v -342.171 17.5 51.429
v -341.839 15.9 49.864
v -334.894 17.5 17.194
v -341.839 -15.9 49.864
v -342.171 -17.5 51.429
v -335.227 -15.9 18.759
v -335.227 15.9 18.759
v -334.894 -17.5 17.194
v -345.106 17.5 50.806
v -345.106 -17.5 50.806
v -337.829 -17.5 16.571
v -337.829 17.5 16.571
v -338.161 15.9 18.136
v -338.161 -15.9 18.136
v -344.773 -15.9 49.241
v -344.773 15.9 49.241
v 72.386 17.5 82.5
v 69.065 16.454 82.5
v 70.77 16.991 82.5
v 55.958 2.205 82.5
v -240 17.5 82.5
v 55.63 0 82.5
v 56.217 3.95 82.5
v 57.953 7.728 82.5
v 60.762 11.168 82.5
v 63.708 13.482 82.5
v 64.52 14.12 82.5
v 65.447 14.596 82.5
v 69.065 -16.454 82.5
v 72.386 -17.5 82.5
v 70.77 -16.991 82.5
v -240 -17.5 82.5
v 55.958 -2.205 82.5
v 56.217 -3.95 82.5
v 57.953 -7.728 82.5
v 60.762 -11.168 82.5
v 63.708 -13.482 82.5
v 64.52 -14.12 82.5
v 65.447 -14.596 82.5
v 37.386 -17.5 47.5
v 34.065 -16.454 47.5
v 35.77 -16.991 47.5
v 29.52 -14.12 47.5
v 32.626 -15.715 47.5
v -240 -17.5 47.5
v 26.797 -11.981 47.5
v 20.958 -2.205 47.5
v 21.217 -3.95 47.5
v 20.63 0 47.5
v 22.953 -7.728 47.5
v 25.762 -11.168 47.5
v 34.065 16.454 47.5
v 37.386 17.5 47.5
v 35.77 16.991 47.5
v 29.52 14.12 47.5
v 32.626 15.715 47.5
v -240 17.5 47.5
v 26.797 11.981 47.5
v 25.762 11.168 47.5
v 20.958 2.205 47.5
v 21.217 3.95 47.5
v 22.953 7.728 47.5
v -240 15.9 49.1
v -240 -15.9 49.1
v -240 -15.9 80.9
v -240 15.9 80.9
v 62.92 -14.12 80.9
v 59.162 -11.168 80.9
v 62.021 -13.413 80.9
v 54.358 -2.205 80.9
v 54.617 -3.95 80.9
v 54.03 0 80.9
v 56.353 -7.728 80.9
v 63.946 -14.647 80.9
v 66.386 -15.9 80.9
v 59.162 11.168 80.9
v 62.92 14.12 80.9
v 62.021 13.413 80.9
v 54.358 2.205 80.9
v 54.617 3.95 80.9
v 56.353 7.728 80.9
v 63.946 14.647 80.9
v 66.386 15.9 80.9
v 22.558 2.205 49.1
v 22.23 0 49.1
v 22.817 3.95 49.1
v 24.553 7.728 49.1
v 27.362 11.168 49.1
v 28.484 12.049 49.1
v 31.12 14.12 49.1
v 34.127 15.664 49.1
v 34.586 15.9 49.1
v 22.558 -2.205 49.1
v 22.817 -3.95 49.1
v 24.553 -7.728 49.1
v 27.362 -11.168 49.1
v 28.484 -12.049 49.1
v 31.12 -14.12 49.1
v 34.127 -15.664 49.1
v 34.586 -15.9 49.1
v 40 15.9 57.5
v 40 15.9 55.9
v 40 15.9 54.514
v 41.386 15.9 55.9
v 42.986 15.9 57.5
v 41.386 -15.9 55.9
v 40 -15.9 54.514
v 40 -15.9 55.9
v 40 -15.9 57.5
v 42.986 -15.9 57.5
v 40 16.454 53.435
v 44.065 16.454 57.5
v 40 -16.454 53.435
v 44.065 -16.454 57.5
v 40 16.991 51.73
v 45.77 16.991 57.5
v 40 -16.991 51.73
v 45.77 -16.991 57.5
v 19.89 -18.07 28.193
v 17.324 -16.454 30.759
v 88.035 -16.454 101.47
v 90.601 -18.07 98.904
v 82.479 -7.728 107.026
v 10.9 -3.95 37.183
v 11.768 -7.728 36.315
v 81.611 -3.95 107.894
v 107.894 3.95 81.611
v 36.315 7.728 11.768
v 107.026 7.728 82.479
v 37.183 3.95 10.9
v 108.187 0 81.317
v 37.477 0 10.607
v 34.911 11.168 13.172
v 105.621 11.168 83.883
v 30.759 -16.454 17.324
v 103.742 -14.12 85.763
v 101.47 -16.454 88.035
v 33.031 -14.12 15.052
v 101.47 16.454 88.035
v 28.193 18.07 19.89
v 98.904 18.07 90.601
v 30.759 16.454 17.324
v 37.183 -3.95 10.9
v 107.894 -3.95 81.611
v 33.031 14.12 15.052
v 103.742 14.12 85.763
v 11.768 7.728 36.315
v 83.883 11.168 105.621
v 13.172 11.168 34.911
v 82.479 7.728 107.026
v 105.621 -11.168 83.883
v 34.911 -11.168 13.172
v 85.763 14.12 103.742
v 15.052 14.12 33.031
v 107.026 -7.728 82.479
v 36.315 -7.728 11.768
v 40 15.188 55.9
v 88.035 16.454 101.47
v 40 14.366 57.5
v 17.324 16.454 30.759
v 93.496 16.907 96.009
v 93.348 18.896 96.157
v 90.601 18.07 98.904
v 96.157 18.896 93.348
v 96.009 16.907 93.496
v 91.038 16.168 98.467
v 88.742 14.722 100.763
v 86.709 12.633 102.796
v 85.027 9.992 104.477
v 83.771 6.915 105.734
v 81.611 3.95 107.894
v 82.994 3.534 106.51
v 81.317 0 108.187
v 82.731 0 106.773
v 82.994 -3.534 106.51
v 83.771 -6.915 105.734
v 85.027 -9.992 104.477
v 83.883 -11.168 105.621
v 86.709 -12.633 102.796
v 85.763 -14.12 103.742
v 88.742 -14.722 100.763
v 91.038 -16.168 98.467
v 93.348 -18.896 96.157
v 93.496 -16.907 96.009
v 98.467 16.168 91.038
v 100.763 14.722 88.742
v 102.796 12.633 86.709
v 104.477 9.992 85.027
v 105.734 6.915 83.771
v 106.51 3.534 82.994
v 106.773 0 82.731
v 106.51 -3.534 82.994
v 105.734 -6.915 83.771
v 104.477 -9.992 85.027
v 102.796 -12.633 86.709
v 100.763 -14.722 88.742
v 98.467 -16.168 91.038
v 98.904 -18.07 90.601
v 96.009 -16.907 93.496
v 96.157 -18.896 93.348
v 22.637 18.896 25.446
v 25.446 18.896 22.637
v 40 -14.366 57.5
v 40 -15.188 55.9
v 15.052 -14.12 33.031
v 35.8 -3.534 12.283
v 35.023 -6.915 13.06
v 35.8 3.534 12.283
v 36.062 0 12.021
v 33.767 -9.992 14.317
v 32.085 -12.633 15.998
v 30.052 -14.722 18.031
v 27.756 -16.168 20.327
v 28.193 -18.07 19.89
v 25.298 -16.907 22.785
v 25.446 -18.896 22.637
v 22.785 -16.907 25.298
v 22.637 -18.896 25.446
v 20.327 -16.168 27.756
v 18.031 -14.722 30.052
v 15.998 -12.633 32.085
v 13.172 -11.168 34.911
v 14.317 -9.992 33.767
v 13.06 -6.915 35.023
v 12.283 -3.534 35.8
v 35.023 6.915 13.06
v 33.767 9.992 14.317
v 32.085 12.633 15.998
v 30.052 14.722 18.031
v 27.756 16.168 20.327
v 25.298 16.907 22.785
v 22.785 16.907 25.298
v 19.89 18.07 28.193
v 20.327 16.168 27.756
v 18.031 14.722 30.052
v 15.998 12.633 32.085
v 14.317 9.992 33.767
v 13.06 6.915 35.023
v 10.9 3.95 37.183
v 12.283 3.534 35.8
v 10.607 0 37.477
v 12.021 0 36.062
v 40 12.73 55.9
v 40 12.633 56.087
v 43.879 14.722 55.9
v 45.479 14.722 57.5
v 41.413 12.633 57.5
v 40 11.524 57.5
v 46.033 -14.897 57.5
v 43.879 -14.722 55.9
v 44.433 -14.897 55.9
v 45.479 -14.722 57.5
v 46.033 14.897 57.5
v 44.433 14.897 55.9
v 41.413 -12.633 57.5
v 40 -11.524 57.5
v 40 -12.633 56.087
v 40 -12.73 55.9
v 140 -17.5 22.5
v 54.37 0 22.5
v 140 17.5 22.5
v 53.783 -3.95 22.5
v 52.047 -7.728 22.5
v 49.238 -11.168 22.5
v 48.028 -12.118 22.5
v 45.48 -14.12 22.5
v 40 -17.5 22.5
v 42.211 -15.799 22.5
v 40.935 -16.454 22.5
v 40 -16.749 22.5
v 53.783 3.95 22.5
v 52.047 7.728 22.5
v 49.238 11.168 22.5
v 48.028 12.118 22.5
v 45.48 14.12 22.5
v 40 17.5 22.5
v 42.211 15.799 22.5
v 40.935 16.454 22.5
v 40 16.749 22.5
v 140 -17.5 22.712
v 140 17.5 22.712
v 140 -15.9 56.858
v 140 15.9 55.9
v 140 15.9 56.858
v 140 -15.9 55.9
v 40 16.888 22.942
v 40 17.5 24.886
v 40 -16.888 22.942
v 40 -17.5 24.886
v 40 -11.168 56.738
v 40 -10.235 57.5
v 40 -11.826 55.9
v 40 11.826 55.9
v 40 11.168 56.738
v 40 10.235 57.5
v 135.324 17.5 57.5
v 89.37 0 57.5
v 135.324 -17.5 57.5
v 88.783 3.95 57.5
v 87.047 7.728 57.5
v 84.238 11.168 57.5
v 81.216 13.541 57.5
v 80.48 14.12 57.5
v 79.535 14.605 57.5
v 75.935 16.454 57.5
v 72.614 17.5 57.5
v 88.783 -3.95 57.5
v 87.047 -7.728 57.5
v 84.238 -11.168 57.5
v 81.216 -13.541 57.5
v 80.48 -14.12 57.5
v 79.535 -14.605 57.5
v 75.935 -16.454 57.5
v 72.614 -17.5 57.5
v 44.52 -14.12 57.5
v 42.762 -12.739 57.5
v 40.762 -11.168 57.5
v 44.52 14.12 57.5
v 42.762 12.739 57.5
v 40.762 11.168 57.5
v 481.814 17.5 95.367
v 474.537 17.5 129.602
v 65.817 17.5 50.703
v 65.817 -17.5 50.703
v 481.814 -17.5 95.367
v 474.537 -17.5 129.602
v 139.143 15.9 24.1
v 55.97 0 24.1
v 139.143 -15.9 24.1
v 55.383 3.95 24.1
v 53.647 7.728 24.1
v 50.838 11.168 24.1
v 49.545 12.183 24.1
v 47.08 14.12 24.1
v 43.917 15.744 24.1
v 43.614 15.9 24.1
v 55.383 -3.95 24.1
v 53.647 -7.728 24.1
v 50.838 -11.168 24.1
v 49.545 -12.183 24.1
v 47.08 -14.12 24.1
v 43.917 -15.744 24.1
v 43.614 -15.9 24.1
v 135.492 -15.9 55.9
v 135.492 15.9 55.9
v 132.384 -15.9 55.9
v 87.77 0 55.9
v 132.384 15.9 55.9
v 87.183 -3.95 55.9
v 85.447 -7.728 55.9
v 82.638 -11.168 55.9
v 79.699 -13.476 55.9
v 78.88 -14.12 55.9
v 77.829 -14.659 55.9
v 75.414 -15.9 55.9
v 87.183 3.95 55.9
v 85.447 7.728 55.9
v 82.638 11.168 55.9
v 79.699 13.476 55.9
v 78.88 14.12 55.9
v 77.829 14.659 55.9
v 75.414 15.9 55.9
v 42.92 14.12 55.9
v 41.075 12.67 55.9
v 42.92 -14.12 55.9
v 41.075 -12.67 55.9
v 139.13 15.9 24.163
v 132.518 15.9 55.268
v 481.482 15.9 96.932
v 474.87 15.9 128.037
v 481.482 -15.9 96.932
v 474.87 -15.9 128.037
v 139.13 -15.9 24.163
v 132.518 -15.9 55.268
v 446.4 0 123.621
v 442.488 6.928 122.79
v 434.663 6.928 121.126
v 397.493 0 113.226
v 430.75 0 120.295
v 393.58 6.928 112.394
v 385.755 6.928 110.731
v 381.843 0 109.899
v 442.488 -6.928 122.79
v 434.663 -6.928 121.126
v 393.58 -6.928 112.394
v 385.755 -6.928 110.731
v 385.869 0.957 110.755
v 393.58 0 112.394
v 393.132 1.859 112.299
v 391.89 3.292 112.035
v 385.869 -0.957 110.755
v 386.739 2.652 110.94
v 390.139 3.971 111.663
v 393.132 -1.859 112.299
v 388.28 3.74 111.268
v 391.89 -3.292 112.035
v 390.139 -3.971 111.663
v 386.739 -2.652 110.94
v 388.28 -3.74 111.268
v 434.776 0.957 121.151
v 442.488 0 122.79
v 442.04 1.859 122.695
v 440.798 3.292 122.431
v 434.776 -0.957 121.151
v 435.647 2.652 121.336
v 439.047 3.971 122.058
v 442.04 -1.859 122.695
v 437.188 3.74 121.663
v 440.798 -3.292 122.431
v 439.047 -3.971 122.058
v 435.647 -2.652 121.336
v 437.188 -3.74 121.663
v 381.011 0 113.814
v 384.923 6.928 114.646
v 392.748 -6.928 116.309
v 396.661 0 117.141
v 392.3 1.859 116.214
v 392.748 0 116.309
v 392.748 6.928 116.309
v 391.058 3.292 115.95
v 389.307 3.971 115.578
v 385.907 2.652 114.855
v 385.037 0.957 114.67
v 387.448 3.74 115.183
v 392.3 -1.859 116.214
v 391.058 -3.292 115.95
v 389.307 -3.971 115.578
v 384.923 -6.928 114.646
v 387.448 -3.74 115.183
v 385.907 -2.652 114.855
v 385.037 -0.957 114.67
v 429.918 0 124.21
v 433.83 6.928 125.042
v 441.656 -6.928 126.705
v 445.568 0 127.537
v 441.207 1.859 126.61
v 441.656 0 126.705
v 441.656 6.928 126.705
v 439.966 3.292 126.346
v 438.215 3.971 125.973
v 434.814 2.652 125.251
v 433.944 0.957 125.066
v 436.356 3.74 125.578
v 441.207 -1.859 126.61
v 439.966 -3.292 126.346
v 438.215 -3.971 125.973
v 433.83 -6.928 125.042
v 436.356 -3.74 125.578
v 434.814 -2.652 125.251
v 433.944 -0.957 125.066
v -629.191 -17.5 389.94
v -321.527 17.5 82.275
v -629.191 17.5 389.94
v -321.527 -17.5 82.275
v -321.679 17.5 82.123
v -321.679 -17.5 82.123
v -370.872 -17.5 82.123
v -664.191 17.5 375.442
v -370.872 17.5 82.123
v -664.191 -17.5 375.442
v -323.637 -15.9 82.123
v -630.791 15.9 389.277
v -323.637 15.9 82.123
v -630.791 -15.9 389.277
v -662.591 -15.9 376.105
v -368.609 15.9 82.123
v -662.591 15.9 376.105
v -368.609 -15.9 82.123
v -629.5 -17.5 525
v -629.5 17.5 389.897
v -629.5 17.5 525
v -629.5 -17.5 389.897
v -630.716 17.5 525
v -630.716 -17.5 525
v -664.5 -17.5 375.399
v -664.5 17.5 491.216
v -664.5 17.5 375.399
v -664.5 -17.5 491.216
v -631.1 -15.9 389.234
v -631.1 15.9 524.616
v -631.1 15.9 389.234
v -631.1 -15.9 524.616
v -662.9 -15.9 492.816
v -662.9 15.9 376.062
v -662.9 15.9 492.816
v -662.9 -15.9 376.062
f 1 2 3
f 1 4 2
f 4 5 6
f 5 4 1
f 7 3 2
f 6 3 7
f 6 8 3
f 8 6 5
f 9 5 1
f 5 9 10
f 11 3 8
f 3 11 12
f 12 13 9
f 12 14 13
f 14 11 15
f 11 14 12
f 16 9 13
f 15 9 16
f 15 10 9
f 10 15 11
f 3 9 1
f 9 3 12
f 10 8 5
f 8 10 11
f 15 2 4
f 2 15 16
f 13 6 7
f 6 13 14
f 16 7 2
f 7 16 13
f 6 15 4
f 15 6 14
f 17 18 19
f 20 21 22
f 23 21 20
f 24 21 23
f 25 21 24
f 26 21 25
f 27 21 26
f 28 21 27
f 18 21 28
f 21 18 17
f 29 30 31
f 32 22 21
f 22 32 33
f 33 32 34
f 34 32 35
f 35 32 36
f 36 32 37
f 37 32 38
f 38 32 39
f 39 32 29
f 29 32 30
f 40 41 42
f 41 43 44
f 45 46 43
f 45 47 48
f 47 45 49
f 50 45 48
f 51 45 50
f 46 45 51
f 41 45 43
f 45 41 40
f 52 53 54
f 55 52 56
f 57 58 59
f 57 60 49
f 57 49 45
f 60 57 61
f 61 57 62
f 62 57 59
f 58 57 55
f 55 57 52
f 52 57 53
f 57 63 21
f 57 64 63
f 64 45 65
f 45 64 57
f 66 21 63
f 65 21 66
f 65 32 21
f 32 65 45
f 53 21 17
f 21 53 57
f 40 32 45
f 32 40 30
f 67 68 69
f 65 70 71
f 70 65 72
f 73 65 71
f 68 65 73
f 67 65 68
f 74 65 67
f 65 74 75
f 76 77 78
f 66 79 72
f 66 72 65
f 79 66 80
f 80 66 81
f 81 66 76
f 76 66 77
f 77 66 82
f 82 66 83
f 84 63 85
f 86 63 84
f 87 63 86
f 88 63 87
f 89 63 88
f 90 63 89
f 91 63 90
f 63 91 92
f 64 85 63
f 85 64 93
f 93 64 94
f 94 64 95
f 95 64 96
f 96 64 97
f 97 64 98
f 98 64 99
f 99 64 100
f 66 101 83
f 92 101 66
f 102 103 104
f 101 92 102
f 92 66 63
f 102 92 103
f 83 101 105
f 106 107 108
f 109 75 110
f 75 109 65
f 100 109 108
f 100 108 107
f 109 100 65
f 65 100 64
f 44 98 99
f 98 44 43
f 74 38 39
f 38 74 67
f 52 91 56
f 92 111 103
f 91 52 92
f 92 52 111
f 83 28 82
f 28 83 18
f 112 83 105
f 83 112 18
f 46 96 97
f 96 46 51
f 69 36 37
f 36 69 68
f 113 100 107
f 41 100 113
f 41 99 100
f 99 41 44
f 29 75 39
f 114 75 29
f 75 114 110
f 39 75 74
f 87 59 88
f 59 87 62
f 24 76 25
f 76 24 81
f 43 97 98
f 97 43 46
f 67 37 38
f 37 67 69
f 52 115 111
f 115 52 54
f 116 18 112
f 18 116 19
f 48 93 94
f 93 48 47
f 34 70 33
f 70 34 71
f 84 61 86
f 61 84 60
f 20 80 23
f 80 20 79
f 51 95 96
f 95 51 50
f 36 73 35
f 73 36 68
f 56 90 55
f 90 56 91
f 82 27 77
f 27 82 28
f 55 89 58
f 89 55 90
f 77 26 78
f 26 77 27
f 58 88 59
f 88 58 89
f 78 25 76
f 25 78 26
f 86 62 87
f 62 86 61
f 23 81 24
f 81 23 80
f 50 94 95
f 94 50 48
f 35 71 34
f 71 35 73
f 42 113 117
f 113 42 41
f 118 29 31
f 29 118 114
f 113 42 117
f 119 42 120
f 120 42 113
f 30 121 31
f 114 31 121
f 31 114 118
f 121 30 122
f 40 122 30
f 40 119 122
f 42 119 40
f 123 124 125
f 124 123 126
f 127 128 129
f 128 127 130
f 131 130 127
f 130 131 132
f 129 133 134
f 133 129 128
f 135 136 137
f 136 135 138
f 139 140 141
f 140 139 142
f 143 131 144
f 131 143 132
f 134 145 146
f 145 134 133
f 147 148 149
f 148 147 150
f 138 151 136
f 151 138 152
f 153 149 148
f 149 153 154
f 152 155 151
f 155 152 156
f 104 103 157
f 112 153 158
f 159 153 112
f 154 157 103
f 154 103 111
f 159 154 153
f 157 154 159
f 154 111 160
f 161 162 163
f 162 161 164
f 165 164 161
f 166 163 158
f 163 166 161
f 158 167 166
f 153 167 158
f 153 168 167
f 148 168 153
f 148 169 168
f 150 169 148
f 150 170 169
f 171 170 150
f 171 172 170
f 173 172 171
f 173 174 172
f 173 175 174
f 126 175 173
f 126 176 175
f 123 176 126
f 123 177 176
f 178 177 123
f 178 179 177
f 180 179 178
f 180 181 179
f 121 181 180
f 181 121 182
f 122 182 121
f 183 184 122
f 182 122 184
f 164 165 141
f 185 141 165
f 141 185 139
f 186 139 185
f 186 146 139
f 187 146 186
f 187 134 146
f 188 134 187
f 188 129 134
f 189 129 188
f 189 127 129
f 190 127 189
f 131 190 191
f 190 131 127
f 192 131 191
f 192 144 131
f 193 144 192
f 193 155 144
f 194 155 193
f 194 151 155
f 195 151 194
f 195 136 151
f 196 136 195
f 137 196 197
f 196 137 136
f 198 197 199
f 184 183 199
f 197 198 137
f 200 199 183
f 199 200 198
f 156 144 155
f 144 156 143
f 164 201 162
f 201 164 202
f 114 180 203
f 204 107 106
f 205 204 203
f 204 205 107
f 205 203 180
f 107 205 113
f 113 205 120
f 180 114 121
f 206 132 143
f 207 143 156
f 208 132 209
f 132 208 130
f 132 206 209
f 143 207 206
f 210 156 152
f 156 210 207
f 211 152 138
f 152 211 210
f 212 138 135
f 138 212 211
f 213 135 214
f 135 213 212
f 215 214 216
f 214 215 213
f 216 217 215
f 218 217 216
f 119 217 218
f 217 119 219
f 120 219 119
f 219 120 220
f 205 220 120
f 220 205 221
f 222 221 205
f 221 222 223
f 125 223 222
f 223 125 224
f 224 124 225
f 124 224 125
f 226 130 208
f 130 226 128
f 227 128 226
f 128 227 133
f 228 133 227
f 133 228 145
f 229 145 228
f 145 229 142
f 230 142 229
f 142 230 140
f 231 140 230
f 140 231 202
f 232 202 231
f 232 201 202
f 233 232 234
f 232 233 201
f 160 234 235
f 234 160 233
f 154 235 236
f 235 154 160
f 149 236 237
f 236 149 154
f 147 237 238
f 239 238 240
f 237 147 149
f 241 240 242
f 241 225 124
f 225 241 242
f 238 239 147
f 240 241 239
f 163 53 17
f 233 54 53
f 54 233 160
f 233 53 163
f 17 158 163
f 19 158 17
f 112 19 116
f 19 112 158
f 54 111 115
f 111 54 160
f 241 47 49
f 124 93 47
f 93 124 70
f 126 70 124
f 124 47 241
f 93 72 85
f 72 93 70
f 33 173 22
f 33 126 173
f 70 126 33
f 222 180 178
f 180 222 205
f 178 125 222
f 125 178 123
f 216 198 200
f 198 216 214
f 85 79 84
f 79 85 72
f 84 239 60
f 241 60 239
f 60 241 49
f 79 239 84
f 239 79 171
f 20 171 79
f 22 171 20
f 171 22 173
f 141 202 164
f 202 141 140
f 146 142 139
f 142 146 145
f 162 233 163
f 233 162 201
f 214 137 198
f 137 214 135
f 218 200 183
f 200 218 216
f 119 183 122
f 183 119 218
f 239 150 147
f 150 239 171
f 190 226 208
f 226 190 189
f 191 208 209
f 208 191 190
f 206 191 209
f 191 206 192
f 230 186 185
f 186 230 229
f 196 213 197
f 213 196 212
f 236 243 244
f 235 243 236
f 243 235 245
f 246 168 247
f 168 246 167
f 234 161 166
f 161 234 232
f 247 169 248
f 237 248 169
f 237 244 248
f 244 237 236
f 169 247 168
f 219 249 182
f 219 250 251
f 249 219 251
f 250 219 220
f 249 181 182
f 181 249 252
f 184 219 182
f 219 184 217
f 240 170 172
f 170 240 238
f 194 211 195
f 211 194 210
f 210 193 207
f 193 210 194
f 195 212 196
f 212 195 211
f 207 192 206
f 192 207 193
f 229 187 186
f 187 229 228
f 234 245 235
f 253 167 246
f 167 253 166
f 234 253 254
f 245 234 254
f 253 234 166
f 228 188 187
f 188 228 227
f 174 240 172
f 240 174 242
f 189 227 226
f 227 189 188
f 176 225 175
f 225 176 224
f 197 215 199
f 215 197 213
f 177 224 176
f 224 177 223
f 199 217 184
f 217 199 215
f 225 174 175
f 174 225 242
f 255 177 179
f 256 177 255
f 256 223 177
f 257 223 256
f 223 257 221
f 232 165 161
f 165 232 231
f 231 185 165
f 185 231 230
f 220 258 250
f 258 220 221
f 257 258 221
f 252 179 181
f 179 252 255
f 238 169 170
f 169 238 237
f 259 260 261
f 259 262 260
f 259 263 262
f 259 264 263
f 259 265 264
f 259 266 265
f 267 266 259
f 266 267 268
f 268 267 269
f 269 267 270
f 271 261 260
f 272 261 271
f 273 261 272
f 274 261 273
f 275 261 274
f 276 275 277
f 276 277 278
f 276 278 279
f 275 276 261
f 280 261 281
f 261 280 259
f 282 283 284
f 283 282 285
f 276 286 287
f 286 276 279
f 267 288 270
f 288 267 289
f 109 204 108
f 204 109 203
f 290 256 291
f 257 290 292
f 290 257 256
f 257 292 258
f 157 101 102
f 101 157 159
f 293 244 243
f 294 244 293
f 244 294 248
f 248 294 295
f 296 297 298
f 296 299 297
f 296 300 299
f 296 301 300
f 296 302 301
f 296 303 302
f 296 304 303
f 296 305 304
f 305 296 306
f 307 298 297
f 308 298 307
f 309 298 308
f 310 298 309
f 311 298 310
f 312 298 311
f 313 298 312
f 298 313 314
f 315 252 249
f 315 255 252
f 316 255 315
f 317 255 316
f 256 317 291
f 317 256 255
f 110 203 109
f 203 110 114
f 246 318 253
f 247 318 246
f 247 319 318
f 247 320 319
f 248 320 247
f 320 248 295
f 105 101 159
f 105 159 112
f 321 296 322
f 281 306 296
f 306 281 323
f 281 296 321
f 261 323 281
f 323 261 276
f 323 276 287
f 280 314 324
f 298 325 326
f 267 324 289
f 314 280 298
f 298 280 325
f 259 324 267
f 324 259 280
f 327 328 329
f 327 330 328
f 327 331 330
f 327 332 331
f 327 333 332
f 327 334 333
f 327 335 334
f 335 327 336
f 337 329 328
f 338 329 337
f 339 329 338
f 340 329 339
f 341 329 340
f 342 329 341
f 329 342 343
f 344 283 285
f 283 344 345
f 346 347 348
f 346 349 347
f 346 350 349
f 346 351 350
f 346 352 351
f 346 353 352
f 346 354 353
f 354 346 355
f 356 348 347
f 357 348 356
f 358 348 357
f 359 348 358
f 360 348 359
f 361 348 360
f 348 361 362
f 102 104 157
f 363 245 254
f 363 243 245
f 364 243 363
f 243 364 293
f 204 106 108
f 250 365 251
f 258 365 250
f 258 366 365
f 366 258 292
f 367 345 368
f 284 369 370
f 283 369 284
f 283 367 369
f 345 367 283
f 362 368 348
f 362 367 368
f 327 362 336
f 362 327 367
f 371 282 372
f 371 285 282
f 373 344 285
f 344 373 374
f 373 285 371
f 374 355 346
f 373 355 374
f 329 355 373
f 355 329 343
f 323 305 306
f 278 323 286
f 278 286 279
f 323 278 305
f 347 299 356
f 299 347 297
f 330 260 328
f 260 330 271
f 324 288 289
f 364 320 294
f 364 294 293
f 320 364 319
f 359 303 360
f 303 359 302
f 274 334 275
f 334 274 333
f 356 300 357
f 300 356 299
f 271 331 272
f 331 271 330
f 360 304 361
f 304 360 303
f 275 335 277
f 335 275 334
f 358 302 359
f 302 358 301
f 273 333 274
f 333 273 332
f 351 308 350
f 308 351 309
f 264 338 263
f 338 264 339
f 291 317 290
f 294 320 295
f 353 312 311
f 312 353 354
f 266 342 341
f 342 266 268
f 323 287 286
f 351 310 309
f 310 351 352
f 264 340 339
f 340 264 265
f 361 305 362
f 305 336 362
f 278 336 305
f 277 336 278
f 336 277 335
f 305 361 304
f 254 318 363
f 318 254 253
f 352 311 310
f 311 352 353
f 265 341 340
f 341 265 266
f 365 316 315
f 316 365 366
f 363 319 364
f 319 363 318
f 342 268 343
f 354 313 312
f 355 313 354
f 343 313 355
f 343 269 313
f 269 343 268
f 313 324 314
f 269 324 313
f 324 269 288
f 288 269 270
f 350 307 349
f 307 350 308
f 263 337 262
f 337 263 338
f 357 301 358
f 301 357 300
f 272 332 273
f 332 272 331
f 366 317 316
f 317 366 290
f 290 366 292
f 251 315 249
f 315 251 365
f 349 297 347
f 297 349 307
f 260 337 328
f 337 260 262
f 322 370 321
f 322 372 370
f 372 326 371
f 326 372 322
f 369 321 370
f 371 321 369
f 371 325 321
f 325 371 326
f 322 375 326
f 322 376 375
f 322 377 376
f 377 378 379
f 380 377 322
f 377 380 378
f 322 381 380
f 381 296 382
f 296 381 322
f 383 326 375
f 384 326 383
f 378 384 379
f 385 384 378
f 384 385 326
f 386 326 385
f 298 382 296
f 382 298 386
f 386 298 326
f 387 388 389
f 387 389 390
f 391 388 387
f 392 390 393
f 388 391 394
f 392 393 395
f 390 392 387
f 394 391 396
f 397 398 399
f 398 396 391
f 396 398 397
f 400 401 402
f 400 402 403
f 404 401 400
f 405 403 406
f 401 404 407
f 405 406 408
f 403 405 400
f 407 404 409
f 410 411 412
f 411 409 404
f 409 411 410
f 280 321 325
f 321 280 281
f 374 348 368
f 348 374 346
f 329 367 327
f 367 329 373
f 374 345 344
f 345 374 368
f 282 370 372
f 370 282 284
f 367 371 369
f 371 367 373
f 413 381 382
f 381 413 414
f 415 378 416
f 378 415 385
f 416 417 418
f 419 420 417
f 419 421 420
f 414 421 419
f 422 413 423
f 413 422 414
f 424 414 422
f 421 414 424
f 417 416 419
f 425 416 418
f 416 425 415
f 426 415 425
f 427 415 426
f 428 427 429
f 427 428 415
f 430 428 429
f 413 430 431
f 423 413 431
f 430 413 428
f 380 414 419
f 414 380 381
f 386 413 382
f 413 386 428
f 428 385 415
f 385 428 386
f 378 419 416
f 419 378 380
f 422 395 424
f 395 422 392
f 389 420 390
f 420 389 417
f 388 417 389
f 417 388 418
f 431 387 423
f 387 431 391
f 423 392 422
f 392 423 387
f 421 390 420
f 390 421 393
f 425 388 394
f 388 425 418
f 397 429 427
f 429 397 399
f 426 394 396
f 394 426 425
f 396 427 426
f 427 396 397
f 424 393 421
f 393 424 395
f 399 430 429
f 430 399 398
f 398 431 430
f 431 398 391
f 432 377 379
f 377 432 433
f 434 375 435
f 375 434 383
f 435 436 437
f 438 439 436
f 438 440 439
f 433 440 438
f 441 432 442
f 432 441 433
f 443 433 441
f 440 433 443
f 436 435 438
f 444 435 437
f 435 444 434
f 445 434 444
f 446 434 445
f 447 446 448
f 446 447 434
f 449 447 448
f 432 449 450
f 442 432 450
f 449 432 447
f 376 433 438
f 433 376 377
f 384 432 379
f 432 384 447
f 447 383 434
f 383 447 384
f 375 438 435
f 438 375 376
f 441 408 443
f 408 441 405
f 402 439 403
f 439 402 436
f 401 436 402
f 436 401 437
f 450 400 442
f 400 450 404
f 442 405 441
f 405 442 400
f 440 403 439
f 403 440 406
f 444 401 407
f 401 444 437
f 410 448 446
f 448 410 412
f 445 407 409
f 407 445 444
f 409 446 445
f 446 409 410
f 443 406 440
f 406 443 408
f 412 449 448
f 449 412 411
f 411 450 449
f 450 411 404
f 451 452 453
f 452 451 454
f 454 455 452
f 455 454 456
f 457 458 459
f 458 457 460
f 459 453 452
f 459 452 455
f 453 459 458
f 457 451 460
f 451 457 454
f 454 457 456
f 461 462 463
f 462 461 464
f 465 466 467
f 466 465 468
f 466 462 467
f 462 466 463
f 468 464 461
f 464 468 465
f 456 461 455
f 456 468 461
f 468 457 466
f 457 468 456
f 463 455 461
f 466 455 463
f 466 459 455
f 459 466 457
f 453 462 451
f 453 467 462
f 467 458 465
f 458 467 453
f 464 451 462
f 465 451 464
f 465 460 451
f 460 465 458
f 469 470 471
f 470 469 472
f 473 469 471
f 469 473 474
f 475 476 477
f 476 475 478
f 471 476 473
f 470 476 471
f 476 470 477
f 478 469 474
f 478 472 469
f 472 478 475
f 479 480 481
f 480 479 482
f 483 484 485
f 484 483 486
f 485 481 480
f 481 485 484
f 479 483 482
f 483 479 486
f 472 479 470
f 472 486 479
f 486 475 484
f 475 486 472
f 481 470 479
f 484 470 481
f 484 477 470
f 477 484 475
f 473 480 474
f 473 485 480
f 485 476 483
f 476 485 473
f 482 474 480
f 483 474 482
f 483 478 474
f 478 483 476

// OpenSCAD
// file: hexagonalprism.scad
hex_prism(6.2,6);



module hex_prism(r,h){
    linear_extrude(height=h){
        hex(r);
    }
}

module hex(r){
    polygon(points = [[r,0],[r/2,r*sqrt(3)/2],
                [-r/2,r*sqrt(3)/2],[-r,0],
                [-r/2,-r*sqrt(3)/2],[r/2,-r*sqrt(3)/2]]);
}
// file: bolts.scad
use <hexagonalprism.scad>

bolt();

translate([30,0,0]) nut();

module kingpin(){
    bolt(d=12.7,l=75);
}

module bolt(d=12.7,l=62){
    rad = d/2;
    len = l;
    color("gray") hex_prism(2*rad,rad*1.4);
    color("silver") cylinder(r=rad,h=len);
}

module nut(d=12.7){
    rad = d/2;
    color("gray") difference(){
        hex_prism(2*rad,rad*1.4);
        color("silver") cylinder(r=rad,rad*1.4+2);
    }
}
// main file
use <./bolts.scad>

mainFrame();

module mainFrame() color("lightblue"){
    //  main horizontal 35x1.6 SHS
    difference(){
        translate([-340,0,34]) rotate([0,-12,0]) difference(){
            cube([3,35,35],center=true);                  //  650
            cube([502,31.8,31.8],center=true);
        }
    }
    
    //  old main horizontal 35x1.6 SHS
    difference(){
        translate([-80,0,65]) difference(){
            cube([320,35,35],center=true);                  //  650
            cube([972,31.8,31.8],center=true);
        }
        //  front chamfer cut
        translate([125,0,45]) 
                rotate([0,-45,0]) cube(100,center=true);
        
        //  cylindical cut for steering boss
        rotate([0,45,0]) 
                translate([0,0,25]) cylinder(r=19,h=100);
    }

    //  steering boss 38x2 EHS
    rotate([0,45,0]) translate([0,0,34]) difference(){
        cylinder(r=19,h=100);                               //  
        translate([0,0,-1]) cylinder(r=17,h=102);
    }

    //  Front horizontal 35x1.6 SHS
    translate([90,0,40]) rotate([0,90,0]) difference(){
        cube([35,35,100],center=true);                      //  200
        cube([31.8,31.8,252],center=true);
//        translate([0,0,-75]) 
//                rotate([0,45,0]) cube(60,center=true);
        translate([30,0,-75]) 
                rotate([0,-45,0]) cylinder(r=19,h=100);
    }
    
    //  front bracket stator 35x1.6 SHS
    translate([307,0,76.1]) rotate([0,-12,0]) difference(){
        cube([350,35,35],center=true);                      //  350
        cube([352,31.8,31.8],center=true);
    }

    //  front bracket lock threads M8 nuts
    translate([390,0,110]) rotate([0,-12,0]){
        nut(8);
        translate([50,0,0]) nut(8);
    }
    
    // main seat back 35x1.6 SHS
    translate([-493,0,229]) rotate([0,-45,0]) difference(){
        cube([35,35,450],center=true);                      //  450
        cube([31.8,31.8,452],center=true);
        translate([0,0,-236]) 
                rotate([0,45,0]) cube([100,100,40],center=true);
        translate([0,0,239]) 
                rotate([0,22.5,0]) cube([100,100,40],center=true);
    }

//    //  seat gusset 35x1.6 SHS
//    translate([-274,-17.5,51.5]) difference(){
//        rotate([0,-62.5,0]) difference(){
//            cube([35,35,150]);                              //  150
//            translate([1.6,1.6,-1])cube([31.8,31.8,152]);
//        }
//        translate([-60,-1,0]) cube([100,37,31]);
//        translate([-47,-1,30]) rotate([0,-135,0]) cube([120,37,35]);
//    }

    //  head restraint 35x1.6 SHS
    translate([-647,0,450]) difference(){
        cube([35,35,150],center=true);                      //  150
        cube([31.8,31.8,452],center=true);
        translate([0,0,-89]) 
                rotate([0,-22.5,0]) cube([100,100,40],center=true);
        translate([0,0,87]) 
                rotate([0,-45,0]) cube([100,100,40],center=true);
    }
}
